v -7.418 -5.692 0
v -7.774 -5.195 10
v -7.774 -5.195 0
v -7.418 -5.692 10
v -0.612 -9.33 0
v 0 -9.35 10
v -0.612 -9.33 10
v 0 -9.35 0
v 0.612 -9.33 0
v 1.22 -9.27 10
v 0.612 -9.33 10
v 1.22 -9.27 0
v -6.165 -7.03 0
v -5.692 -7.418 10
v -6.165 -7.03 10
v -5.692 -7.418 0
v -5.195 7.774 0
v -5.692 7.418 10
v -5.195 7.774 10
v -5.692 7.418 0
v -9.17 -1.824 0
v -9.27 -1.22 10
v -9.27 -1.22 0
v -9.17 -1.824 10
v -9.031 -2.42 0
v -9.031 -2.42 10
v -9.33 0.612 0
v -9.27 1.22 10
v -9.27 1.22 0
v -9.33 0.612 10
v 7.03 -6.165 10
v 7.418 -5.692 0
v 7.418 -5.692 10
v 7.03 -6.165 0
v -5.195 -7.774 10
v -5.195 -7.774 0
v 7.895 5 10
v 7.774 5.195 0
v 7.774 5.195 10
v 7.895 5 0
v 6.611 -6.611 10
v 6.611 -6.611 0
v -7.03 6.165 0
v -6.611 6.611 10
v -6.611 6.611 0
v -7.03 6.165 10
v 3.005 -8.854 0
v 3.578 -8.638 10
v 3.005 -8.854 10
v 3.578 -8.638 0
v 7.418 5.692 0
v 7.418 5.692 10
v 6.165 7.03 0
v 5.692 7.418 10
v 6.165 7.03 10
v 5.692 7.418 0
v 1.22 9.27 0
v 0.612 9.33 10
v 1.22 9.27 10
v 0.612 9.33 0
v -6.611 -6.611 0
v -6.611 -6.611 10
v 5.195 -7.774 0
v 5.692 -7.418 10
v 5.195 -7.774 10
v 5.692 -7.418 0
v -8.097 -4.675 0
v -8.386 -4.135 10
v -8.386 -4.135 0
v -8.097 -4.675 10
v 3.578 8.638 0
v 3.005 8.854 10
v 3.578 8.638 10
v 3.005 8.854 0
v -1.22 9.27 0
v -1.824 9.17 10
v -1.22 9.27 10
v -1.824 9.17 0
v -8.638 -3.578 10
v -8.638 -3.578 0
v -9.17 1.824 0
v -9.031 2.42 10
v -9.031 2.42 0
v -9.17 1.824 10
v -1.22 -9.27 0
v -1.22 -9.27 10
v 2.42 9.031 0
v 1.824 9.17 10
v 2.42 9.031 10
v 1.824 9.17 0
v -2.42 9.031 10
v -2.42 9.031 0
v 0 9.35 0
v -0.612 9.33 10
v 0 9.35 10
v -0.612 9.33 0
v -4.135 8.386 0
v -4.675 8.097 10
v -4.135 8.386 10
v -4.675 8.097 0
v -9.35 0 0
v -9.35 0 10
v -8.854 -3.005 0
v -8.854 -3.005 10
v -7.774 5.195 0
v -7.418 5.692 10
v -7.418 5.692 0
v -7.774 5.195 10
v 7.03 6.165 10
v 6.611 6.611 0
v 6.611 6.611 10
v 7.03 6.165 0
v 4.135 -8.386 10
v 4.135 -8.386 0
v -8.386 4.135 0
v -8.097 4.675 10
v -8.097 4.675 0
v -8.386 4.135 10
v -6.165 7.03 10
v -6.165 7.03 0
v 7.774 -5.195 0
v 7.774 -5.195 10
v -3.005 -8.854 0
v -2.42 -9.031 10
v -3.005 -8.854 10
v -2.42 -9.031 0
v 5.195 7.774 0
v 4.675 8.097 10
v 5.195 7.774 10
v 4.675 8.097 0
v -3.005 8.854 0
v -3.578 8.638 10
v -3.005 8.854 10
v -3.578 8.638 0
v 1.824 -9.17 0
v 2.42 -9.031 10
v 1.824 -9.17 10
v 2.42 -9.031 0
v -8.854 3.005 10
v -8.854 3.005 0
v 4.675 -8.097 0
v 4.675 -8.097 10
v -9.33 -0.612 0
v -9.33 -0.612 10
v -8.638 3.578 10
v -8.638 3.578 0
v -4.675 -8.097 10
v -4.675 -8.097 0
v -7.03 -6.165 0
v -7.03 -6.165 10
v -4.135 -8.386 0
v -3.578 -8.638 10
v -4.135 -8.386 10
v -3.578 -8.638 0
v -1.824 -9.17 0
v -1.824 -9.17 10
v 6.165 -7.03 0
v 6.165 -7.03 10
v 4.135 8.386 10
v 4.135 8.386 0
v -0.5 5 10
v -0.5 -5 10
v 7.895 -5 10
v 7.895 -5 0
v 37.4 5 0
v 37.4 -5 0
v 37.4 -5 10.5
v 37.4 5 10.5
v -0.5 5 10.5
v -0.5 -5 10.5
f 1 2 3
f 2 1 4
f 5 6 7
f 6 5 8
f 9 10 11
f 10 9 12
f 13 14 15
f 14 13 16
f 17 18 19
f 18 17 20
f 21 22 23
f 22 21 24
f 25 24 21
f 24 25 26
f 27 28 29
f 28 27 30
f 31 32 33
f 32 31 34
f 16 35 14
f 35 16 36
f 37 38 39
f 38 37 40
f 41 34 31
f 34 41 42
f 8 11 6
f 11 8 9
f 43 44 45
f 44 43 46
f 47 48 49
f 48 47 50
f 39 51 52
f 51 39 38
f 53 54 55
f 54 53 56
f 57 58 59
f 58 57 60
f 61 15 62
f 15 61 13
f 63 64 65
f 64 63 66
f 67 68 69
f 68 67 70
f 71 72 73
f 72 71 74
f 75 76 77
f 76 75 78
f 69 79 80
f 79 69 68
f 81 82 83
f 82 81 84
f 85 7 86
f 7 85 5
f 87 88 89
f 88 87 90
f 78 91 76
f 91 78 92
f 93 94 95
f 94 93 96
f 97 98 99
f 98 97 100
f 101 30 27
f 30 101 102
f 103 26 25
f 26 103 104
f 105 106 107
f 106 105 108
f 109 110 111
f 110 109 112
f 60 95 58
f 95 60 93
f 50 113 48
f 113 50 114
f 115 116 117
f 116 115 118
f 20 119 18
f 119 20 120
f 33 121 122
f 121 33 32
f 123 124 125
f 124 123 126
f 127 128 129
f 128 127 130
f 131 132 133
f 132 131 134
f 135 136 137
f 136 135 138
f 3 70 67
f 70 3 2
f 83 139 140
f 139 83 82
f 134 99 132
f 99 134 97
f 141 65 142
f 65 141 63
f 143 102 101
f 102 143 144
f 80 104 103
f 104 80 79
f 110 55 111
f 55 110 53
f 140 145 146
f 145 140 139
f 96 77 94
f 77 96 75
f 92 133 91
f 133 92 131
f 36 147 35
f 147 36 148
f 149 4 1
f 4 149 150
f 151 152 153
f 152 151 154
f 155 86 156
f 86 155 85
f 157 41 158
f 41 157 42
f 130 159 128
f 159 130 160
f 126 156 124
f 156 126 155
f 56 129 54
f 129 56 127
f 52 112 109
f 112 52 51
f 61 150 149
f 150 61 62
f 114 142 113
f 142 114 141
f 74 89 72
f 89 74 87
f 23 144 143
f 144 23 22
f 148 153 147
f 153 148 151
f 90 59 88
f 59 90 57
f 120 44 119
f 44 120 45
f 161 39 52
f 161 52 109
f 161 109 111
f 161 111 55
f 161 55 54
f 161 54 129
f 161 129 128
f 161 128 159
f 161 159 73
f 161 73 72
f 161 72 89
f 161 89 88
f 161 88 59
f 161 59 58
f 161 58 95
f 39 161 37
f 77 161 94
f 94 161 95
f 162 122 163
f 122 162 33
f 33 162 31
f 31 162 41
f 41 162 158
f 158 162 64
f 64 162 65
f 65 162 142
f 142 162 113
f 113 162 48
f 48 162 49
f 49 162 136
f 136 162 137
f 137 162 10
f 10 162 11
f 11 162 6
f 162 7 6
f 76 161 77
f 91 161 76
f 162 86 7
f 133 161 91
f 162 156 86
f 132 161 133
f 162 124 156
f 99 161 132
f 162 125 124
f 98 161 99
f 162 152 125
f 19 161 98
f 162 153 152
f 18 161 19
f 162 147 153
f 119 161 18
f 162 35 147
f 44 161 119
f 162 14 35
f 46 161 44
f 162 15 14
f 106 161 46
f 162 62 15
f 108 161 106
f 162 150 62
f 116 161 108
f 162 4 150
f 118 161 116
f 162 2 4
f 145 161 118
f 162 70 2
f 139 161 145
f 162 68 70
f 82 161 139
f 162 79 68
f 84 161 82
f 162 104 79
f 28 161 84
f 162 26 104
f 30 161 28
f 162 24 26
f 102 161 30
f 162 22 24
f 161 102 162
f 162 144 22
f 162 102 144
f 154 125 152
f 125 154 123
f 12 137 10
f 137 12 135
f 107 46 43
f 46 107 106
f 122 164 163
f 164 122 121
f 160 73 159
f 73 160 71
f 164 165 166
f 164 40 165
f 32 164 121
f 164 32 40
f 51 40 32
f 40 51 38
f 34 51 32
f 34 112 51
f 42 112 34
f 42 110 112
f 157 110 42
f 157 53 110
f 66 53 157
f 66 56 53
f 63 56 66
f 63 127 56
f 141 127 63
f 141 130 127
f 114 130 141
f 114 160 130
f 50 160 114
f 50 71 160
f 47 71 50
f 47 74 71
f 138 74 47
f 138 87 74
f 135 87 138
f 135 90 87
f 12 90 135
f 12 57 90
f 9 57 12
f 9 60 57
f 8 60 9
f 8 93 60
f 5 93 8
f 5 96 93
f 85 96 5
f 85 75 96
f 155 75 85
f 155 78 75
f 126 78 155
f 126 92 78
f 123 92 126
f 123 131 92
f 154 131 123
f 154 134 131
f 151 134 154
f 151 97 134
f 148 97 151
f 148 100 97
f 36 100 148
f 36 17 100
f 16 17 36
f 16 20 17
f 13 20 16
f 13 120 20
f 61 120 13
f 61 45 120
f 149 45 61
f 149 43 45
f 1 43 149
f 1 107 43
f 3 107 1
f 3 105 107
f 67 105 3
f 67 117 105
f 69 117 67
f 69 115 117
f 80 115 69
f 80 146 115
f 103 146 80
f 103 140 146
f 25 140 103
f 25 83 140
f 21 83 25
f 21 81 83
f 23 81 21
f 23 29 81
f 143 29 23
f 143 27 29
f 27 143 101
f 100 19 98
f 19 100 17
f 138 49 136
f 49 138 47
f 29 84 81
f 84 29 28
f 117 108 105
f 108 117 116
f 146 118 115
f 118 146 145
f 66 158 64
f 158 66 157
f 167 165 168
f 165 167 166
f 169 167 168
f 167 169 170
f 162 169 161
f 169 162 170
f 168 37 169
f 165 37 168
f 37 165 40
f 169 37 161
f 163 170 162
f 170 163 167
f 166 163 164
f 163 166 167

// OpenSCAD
// Snap-on clip that holds a piece of tubing next to a 12.7 mm (1/2 inch) lab stand rod.
// Printed flat: a 10 mm tall extrusion (Z) of a 2-D profile in the XY plane.
//
// Profile (in the XY plane):
//   1) A rod ring with 12.7 mm inner diameter and 3 mm wall (18.7 mm outer diameter),
//      centred at the origin, with a 10 mm wide opening cut out of its -X side
//      (everything with x < 0 and -5 < y < 5 is removed from this ring).
//      This snaps onto the rod.
//   2) A tubing ring with 6 mm inner diameter and 2 mm wall, centred at x = 15, y = 0,
//      with a 4.5 mm wide opening cut out of its +X side (x > 15 and -2.25 < y < 2.25).
//   3) A solid bridge 6 mm wide (Y) between x = 8 and x = 12 that joins the two rings
//      without blocking either ring's hole.

// ---------- Parameters ----------
rod_id        = 12.7;   // stand rod inner diameter
rod_wall      = 3;      // stand rod ring wall thickness
ring_open     = 10;     // stand rod ring opening width (along Y)
ring_open_x   = -0;     // stand rod ring opening centre X

tubing_id     = 6;      // tubing inner diameter
tubing_wall   = 2;      // tubing ring wall thickness
tubing_open   = 4.5;    // tubing ring opening width (along Y)
tubing_x      = 15;     // tubing ring centre X

bridge_w      = 6;      // bridge width (along Y)
bridge_x1     = 8;      // bridge start X
bridge_x2     = 12;     // bridge end X

eps           = 0.5;    // cutter overshoot past faces
$fn           = 96;     // curve resolution

// ---------- Derived ----------
rod_od    = rod_id + 2 * rod_wall;   // 18.7 mm
tubing_od = tubing_id + 2 * tubing_wall; // 10 mm

// ---------- Profile ----------
difference() {
    union() {
        // Stand rod ring
        translate([0, 0, 0])
            cylinder(d = rod_od, h = 10);
        // Stand rod ring opening (x < 0, -ring_open/2 < y < ring_open/2)
        translate([ring_open_x - eps, -ring_open / 2, 0])
            cube([eps + 2 * rod_od, ring_open, 10 + eps]);

        // Tubing ring
        translate([tubing_x, 0, 0])
            cylinder(d = tubing_od, h = 10);
        // Tubing ring opening (x > tubing_x, -tubing_open/2 < y < tubing_open/2)
        translate([tubing_x + eps, -tubing_open / 2, 0])
            cube([eps + 2 * tubing_od, tubing_open, 10 + eps]);

        // Solid bridge between x = 8 and x = 12
        translate([bridge_x1, -bridge_w / 2, 0])
            cube([bridge_x2 - bridge_x1 + eps, bridge_w, 10 + eps]);
    }
}
